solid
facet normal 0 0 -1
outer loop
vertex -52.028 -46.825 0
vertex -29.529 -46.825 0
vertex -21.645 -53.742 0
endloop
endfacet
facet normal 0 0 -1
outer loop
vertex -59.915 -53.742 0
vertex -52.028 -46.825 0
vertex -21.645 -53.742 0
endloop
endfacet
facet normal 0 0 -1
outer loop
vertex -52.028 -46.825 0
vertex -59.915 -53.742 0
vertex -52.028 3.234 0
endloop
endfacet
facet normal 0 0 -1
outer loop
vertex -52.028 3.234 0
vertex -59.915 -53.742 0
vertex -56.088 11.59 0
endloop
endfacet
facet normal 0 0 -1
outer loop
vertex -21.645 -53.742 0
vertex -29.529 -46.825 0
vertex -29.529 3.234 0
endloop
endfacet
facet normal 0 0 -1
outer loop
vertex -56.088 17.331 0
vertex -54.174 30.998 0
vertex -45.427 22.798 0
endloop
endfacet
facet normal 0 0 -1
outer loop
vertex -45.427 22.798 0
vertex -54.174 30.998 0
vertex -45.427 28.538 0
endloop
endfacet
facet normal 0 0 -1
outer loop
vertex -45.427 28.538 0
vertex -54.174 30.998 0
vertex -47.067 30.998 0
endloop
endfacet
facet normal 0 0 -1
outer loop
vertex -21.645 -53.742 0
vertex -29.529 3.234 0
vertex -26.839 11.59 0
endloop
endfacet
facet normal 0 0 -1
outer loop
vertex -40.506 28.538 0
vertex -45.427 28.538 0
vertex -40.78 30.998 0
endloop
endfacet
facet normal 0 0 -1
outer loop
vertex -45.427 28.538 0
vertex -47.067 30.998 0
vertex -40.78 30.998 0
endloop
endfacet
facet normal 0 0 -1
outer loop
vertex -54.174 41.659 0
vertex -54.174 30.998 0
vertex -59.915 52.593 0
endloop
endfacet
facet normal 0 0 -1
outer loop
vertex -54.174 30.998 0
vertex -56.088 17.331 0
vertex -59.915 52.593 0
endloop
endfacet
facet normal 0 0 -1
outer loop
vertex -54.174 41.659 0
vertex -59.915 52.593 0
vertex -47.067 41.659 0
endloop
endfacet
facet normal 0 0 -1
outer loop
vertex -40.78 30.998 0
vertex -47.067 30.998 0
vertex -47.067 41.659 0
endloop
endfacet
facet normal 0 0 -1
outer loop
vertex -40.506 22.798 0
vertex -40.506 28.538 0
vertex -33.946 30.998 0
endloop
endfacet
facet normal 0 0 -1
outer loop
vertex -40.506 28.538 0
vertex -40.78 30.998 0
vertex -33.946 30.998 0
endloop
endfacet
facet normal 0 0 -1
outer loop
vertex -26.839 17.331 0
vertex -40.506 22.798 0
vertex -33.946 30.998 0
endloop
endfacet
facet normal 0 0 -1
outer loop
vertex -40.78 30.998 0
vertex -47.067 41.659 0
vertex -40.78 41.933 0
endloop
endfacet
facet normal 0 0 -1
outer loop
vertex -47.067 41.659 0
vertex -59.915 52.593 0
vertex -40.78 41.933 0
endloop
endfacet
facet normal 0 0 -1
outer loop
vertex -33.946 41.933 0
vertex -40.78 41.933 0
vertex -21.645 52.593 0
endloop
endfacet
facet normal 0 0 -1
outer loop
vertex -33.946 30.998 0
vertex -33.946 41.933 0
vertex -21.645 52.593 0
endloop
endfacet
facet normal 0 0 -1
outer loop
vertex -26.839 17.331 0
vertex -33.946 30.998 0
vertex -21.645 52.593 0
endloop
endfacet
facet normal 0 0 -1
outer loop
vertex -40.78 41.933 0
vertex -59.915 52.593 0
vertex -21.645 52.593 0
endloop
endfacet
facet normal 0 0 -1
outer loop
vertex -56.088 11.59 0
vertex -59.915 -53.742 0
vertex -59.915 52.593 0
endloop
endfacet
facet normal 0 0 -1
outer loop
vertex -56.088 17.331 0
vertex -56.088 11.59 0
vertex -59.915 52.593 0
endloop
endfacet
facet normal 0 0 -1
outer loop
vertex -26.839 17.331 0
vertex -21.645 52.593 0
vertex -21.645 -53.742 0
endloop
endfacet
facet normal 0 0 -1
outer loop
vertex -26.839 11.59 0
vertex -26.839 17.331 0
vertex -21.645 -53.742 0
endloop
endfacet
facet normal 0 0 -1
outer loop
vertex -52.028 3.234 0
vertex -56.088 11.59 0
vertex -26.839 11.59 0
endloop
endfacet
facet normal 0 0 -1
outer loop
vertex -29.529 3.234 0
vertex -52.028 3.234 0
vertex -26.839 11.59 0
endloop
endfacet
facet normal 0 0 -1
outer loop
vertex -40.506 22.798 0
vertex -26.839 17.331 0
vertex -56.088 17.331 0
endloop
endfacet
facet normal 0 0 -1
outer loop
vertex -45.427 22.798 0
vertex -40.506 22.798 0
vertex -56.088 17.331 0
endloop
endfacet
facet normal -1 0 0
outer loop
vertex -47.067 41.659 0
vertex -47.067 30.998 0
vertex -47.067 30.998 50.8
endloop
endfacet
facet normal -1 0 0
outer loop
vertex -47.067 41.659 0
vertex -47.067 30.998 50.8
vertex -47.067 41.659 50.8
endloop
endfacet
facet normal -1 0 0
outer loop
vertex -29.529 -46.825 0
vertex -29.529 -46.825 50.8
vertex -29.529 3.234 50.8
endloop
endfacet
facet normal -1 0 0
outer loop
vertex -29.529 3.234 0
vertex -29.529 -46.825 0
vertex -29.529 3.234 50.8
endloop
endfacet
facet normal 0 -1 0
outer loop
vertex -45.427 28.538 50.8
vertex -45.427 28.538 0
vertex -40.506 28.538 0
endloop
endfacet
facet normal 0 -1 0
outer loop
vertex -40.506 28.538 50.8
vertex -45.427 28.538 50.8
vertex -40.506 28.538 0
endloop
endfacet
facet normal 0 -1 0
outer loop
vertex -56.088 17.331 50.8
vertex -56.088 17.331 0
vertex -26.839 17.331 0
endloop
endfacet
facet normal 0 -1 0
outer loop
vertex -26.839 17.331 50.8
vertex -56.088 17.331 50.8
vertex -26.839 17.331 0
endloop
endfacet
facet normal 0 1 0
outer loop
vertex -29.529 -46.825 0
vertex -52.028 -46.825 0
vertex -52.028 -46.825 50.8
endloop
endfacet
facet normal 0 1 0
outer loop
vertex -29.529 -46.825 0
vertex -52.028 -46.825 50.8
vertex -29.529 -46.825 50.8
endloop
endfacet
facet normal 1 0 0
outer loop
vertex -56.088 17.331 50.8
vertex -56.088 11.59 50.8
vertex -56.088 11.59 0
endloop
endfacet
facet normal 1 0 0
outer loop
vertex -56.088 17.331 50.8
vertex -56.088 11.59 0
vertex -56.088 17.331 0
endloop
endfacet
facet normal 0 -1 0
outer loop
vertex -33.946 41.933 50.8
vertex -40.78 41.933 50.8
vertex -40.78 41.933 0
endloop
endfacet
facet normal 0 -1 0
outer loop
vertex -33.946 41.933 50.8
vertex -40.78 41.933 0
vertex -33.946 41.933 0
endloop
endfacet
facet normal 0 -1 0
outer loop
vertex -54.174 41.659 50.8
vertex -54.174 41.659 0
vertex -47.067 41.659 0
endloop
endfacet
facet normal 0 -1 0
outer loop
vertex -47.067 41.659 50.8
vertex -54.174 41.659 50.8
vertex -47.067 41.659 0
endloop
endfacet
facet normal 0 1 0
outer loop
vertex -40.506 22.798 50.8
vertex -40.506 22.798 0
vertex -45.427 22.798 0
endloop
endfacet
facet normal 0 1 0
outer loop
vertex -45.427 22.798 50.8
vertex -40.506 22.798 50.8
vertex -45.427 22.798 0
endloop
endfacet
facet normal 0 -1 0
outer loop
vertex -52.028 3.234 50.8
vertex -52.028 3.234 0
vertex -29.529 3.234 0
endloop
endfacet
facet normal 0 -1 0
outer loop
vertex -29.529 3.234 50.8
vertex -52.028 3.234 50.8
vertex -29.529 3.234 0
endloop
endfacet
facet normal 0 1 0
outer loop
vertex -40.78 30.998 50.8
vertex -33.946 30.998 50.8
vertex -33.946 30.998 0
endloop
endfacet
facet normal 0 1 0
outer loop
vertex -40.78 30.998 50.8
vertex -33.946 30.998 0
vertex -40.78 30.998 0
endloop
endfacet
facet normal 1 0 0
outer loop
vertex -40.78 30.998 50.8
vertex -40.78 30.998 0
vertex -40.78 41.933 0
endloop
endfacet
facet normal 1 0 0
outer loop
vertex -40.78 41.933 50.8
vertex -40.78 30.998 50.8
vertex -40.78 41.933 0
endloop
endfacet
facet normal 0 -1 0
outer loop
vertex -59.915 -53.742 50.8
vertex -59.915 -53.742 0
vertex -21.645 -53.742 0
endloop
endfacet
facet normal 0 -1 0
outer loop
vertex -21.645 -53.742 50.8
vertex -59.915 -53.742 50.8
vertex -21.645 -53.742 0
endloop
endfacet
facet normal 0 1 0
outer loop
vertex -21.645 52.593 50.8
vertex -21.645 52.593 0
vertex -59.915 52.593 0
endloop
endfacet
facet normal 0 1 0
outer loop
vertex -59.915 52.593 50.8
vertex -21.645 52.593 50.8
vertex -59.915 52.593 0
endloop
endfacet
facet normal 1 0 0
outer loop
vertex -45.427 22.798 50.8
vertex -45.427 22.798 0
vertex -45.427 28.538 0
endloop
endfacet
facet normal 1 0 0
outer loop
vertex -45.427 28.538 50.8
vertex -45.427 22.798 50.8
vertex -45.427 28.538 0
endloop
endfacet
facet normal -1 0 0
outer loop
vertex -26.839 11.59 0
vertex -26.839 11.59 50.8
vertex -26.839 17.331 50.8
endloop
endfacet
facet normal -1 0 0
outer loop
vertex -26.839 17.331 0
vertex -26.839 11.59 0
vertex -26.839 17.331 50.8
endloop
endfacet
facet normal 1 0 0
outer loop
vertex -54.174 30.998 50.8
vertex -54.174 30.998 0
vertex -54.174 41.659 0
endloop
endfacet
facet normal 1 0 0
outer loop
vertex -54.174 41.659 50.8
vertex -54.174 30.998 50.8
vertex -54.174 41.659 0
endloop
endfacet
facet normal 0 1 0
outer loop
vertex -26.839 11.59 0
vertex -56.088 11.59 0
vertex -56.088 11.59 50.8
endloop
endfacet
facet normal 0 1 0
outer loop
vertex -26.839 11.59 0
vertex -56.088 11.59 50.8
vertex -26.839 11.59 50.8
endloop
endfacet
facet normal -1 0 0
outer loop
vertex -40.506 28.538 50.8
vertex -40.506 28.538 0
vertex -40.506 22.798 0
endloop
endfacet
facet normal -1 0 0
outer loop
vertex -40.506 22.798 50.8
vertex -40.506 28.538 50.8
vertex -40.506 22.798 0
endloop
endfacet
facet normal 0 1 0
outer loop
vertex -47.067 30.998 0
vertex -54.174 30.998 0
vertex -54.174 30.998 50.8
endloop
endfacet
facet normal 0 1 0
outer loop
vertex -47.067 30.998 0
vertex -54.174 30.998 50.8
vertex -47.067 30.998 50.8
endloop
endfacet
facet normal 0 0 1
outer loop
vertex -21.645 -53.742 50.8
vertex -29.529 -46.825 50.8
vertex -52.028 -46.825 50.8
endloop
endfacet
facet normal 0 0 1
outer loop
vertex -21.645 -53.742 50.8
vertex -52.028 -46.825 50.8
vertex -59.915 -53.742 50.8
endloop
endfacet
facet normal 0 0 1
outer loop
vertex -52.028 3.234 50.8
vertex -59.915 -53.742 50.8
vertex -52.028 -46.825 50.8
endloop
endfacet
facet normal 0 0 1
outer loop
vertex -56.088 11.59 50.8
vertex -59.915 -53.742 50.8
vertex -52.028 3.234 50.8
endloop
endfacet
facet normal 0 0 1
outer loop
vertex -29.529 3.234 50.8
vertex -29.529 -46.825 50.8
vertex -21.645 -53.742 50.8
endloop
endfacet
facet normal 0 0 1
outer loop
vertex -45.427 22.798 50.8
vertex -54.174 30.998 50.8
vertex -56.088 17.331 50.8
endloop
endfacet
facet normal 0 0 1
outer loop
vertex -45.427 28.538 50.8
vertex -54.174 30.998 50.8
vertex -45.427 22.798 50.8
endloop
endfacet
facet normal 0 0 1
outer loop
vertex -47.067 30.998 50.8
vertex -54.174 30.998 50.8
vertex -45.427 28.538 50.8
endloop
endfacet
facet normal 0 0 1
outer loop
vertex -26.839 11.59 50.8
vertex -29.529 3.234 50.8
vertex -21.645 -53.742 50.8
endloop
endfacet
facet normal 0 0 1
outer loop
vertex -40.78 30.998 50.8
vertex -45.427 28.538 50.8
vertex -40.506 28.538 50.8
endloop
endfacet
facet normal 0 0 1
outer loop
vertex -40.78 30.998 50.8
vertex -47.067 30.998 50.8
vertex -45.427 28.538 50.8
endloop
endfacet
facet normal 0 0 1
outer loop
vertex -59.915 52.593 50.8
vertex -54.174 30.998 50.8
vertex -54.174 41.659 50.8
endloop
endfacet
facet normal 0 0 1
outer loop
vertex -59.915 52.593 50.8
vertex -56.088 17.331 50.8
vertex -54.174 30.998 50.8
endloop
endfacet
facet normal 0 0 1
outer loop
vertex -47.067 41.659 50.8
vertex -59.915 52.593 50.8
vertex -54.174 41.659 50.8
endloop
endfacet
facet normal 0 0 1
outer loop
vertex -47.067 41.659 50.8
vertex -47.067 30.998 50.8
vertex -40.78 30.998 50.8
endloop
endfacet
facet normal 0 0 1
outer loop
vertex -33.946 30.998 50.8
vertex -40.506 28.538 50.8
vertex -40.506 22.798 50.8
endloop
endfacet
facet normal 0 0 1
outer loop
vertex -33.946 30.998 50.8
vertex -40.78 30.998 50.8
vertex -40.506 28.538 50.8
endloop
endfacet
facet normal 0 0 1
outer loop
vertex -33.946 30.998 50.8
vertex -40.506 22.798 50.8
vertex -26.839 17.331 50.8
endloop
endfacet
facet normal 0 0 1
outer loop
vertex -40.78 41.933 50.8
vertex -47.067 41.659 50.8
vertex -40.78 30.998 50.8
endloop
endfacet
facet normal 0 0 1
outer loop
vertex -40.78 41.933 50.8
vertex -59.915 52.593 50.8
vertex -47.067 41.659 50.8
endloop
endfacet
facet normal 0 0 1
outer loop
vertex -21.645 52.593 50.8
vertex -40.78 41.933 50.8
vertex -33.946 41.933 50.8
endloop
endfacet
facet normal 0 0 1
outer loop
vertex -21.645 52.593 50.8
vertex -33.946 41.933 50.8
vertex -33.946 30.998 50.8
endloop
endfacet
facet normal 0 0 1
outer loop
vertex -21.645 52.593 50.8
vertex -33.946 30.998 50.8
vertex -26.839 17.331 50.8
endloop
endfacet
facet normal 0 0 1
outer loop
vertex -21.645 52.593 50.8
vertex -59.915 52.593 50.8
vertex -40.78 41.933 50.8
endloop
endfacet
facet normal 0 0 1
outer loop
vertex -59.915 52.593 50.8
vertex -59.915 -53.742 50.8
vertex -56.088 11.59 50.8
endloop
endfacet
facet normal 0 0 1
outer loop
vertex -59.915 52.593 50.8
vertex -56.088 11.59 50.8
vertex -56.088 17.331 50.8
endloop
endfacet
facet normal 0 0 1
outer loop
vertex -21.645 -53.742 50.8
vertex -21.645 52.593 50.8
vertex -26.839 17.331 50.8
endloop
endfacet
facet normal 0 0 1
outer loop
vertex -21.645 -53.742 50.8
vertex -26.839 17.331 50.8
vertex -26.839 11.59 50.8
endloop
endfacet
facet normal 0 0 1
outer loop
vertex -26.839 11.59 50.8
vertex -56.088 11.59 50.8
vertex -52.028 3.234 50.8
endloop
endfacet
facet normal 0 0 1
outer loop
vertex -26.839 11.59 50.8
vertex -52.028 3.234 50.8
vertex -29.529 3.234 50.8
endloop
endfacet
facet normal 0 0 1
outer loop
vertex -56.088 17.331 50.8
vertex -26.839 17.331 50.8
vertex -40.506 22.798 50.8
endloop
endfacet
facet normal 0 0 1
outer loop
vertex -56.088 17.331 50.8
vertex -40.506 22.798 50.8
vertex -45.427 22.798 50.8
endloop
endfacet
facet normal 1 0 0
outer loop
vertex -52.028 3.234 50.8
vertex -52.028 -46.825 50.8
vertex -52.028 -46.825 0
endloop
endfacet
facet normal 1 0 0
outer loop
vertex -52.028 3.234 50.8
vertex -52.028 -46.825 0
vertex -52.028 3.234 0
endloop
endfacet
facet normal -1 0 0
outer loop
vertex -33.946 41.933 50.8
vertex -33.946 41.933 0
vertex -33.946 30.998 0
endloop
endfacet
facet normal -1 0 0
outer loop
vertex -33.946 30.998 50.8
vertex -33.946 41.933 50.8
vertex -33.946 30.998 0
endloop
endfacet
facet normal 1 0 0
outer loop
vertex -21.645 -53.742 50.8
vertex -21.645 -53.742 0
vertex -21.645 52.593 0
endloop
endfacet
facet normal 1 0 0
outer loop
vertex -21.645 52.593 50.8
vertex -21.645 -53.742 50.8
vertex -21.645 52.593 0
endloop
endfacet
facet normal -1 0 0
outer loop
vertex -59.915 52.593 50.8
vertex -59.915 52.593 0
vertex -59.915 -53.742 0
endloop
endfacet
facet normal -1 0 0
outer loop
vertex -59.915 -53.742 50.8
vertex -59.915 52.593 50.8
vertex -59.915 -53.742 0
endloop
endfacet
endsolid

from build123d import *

# Parameters (mm, degrees)
F0_W     = 22.498419
F0_H     = 50.058983
F0_W_2   = 29.24906
F0_H_2   = 5.740468
F0_W_3   = 7.107251
F0_H_3   = 10.660874
F1_DEPTH = 50.8


with BuildPart() as f1:
    # F0 (on Top) → F1 (new body)
    with BuildSketch(Plane.XY):
        Polygon((-21.644898, 52.593466), (-59.914693, 52.593466), (-59.914693, 39.472394), (-59.914693, 34.825347), (-59.914693, 6.66971), (-59.914693, -53.741902), (-56.087717, -53.741902), (-26.5653, -53.741902), (-21.644898, -53.741902), (-21.644898, 6.66971), (-21.644898, 34.825347), (-21.644898, 39.472394), align=None)
        with Locations((-40.778385, -21.795344)):
            Rectangle(F0_W, F0_H, mode=Mode.SUBTRACT)
        with Locations((-41.463187, 14.460347)):
            Rectangle(F0_W_2, F0_H_2, mode=Mode.SUBTRACT)
        Polygon((-45.426842, 22.797696), (-45.426842, 28.538166), (-40.600547, 28.538166), (-40.506441, 28.538166), (-40.506441, 22.797696), align=None, mode=Mode.SUBTRACT)
        with Locations((-50.6206, 36.328803)):
            Rectangle(F0_W_3, F0_H_3, mode=Mode.SUBTRACT)
        Polygon((-40.779795, 39.472394), (-40.779795, 41.932594), (-33.945903, 41.932594), (-33.945903, 30.998366), (-40.640878, 30.998366), (-40.779795, 30.998366), align=None, mode=Mode.SUBTRACT)
    extrude(amount=F1_DEPTH)


solid = f1.part
